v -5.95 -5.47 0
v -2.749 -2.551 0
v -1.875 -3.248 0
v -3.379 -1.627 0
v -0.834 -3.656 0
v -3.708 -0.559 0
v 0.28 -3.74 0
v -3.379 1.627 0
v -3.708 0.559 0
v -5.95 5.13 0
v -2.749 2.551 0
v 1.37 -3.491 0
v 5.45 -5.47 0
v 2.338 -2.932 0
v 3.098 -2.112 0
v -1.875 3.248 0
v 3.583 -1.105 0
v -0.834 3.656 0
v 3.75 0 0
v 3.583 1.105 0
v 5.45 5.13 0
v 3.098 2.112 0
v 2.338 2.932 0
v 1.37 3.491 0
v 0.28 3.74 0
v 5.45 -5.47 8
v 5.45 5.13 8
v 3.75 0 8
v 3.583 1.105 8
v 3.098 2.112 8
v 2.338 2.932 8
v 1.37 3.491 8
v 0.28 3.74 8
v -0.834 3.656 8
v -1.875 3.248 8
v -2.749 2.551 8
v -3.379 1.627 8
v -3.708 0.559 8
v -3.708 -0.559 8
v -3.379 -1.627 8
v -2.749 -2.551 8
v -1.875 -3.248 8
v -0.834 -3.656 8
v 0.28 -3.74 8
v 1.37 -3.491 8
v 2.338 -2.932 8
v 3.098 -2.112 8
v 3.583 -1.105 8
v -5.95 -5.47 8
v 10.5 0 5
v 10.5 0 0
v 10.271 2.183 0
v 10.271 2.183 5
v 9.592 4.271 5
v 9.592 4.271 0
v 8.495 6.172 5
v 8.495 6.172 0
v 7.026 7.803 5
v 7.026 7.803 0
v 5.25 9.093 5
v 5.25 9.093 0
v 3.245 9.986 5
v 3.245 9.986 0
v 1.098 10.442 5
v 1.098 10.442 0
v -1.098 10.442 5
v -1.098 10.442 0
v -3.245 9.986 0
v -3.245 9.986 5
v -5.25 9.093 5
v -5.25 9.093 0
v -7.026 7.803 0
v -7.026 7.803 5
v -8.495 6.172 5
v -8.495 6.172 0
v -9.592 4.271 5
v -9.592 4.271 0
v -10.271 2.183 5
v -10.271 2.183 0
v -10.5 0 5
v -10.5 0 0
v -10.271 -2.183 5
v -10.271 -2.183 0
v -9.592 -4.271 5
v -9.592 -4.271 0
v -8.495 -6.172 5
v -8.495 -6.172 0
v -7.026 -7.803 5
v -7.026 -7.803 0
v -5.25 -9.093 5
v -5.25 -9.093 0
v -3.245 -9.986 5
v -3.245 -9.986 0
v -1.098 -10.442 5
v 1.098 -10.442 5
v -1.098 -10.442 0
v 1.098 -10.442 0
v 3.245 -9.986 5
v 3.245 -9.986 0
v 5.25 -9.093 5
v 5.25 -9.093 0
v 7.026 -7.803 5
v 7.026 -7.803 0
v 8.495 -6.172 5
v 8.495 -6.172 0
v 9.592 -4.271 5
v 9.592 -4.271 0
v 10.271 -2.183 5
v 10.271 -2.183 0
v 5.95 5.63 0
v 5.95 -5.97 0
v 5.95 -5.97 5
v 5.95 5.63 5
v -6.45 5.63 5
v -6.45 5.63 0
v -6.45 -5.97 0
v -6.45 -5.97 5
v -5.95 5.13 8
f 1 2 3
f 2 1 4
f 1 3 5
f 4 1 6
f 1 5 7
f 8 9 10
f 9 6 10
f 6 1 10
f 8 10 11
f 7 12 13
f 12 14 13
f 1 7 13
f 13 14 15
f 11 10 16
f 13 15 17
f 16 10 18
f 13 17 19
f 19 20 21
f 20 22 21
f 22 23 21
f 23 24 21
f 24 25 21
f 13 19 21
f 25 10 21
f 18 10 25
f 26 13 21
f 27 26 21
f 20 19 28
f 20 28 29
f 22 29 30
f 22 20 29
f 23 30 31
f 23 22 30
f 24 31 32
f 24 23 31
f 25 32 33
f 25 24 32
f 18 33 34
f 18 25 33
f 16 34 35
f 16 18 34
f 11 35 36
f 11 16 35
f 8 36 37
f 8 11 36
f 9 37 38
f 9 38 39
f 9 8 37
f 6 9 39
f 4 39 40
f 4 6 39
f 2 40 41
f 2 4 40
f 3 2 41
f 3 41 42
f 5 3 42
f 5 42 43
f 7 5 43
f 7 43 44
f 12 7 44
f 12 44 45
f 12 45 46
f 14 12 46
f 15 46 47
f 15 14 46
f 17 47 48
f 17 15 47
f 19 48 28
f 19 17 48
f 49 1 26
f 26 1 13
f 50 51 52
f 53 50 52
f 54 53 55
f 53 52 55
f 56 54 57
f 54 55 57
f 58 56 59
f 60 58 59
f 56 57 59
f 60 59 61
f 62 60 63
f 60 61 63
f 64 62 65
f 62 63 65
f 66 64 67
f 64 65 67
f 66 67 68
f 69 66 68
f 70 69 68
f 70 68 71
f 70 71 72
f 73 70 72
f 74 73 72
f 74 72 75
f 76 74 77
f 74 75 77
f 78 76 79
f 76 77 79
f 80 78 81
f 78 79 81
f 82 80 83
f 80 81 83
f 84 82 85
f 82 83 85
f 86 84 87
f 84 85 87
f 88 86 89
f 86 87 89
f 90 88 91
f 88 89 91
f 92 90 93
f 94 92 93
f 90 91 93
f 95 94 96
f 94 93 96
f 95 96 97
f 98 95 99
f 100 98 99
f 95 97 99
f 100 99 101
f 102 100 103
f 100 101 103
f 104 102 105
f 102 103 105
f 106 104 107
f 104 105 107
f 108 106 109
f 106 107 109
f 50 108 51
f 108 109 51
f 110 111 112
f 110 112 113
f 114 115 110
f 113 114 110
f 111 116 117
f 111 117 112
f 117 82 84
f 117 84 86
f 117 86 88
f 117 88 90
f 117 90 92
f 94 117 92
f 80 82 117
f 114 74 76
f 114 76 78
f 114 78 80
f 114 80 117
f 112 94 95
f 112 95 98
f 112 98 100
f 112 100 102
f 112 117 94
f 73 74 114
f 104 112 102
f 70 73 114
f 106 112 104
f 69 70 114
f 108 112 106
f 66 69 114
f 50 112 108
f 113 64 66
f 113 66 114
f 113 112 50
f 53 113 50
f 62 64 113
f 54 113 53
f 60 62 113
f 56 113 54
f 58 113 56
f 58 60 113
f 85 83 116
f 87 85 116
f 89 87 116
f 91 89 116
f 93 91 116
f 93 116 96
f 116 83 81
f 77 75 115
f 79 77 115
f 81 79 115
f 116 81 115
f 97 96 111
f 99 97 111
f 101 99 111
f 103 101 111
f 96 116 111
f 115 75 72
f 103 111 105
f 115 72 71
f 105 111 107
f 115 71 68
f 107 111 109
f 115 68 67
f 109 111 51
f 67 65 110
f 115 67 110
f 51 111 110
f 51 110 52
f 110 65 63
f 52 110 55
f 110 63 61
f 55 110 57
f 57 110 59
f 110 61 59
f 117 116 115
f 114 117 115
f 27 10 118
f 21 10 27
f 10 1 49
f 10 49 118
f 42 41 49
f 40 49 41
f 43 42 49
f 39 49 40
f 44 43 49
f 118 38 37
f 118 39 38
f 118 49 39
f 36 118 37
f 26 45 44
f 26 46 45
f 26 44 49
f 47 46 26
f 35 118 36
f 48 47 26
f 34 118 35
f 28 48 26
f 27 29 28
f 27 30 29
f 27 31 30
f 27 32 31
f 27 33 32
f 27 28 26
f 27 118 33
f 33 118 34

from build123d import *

# Parameters (mm, degrees)
F0_W     = 11.4
F0_H     = 10.6
F0_R     = 3.75
F1_DEPTH = 8
F2_R     = 10.5
F2_W     = 12.4
F2_H     = 11.6
F3_DEPTH = 5


with BuildPart() as f1:
    # F0 (on Top) → F1 (new body)
    with BuildSketch(Plane.XY):
        with Locations((-0.25, -0.17)):
            Rectangle(F0_W, F0_H)
        Circle(F0_R, mode=Mode.SUBTRACT)
    extrude(amount=F1_DEPTH)


with BuildPart() as f3:
    # F2 (on Top) → F3 (new body)
    with BuildSketch(Plane.XY):
        Circle(F2_R)
        with Locations((-0.25, -0.17)):
            Rectangle(F2_W, F2_H, mode=Mode.SUBTRACT)
    extrude(amount=F3_DEPTH)


solid = Compound([f1.part, f3.part])
